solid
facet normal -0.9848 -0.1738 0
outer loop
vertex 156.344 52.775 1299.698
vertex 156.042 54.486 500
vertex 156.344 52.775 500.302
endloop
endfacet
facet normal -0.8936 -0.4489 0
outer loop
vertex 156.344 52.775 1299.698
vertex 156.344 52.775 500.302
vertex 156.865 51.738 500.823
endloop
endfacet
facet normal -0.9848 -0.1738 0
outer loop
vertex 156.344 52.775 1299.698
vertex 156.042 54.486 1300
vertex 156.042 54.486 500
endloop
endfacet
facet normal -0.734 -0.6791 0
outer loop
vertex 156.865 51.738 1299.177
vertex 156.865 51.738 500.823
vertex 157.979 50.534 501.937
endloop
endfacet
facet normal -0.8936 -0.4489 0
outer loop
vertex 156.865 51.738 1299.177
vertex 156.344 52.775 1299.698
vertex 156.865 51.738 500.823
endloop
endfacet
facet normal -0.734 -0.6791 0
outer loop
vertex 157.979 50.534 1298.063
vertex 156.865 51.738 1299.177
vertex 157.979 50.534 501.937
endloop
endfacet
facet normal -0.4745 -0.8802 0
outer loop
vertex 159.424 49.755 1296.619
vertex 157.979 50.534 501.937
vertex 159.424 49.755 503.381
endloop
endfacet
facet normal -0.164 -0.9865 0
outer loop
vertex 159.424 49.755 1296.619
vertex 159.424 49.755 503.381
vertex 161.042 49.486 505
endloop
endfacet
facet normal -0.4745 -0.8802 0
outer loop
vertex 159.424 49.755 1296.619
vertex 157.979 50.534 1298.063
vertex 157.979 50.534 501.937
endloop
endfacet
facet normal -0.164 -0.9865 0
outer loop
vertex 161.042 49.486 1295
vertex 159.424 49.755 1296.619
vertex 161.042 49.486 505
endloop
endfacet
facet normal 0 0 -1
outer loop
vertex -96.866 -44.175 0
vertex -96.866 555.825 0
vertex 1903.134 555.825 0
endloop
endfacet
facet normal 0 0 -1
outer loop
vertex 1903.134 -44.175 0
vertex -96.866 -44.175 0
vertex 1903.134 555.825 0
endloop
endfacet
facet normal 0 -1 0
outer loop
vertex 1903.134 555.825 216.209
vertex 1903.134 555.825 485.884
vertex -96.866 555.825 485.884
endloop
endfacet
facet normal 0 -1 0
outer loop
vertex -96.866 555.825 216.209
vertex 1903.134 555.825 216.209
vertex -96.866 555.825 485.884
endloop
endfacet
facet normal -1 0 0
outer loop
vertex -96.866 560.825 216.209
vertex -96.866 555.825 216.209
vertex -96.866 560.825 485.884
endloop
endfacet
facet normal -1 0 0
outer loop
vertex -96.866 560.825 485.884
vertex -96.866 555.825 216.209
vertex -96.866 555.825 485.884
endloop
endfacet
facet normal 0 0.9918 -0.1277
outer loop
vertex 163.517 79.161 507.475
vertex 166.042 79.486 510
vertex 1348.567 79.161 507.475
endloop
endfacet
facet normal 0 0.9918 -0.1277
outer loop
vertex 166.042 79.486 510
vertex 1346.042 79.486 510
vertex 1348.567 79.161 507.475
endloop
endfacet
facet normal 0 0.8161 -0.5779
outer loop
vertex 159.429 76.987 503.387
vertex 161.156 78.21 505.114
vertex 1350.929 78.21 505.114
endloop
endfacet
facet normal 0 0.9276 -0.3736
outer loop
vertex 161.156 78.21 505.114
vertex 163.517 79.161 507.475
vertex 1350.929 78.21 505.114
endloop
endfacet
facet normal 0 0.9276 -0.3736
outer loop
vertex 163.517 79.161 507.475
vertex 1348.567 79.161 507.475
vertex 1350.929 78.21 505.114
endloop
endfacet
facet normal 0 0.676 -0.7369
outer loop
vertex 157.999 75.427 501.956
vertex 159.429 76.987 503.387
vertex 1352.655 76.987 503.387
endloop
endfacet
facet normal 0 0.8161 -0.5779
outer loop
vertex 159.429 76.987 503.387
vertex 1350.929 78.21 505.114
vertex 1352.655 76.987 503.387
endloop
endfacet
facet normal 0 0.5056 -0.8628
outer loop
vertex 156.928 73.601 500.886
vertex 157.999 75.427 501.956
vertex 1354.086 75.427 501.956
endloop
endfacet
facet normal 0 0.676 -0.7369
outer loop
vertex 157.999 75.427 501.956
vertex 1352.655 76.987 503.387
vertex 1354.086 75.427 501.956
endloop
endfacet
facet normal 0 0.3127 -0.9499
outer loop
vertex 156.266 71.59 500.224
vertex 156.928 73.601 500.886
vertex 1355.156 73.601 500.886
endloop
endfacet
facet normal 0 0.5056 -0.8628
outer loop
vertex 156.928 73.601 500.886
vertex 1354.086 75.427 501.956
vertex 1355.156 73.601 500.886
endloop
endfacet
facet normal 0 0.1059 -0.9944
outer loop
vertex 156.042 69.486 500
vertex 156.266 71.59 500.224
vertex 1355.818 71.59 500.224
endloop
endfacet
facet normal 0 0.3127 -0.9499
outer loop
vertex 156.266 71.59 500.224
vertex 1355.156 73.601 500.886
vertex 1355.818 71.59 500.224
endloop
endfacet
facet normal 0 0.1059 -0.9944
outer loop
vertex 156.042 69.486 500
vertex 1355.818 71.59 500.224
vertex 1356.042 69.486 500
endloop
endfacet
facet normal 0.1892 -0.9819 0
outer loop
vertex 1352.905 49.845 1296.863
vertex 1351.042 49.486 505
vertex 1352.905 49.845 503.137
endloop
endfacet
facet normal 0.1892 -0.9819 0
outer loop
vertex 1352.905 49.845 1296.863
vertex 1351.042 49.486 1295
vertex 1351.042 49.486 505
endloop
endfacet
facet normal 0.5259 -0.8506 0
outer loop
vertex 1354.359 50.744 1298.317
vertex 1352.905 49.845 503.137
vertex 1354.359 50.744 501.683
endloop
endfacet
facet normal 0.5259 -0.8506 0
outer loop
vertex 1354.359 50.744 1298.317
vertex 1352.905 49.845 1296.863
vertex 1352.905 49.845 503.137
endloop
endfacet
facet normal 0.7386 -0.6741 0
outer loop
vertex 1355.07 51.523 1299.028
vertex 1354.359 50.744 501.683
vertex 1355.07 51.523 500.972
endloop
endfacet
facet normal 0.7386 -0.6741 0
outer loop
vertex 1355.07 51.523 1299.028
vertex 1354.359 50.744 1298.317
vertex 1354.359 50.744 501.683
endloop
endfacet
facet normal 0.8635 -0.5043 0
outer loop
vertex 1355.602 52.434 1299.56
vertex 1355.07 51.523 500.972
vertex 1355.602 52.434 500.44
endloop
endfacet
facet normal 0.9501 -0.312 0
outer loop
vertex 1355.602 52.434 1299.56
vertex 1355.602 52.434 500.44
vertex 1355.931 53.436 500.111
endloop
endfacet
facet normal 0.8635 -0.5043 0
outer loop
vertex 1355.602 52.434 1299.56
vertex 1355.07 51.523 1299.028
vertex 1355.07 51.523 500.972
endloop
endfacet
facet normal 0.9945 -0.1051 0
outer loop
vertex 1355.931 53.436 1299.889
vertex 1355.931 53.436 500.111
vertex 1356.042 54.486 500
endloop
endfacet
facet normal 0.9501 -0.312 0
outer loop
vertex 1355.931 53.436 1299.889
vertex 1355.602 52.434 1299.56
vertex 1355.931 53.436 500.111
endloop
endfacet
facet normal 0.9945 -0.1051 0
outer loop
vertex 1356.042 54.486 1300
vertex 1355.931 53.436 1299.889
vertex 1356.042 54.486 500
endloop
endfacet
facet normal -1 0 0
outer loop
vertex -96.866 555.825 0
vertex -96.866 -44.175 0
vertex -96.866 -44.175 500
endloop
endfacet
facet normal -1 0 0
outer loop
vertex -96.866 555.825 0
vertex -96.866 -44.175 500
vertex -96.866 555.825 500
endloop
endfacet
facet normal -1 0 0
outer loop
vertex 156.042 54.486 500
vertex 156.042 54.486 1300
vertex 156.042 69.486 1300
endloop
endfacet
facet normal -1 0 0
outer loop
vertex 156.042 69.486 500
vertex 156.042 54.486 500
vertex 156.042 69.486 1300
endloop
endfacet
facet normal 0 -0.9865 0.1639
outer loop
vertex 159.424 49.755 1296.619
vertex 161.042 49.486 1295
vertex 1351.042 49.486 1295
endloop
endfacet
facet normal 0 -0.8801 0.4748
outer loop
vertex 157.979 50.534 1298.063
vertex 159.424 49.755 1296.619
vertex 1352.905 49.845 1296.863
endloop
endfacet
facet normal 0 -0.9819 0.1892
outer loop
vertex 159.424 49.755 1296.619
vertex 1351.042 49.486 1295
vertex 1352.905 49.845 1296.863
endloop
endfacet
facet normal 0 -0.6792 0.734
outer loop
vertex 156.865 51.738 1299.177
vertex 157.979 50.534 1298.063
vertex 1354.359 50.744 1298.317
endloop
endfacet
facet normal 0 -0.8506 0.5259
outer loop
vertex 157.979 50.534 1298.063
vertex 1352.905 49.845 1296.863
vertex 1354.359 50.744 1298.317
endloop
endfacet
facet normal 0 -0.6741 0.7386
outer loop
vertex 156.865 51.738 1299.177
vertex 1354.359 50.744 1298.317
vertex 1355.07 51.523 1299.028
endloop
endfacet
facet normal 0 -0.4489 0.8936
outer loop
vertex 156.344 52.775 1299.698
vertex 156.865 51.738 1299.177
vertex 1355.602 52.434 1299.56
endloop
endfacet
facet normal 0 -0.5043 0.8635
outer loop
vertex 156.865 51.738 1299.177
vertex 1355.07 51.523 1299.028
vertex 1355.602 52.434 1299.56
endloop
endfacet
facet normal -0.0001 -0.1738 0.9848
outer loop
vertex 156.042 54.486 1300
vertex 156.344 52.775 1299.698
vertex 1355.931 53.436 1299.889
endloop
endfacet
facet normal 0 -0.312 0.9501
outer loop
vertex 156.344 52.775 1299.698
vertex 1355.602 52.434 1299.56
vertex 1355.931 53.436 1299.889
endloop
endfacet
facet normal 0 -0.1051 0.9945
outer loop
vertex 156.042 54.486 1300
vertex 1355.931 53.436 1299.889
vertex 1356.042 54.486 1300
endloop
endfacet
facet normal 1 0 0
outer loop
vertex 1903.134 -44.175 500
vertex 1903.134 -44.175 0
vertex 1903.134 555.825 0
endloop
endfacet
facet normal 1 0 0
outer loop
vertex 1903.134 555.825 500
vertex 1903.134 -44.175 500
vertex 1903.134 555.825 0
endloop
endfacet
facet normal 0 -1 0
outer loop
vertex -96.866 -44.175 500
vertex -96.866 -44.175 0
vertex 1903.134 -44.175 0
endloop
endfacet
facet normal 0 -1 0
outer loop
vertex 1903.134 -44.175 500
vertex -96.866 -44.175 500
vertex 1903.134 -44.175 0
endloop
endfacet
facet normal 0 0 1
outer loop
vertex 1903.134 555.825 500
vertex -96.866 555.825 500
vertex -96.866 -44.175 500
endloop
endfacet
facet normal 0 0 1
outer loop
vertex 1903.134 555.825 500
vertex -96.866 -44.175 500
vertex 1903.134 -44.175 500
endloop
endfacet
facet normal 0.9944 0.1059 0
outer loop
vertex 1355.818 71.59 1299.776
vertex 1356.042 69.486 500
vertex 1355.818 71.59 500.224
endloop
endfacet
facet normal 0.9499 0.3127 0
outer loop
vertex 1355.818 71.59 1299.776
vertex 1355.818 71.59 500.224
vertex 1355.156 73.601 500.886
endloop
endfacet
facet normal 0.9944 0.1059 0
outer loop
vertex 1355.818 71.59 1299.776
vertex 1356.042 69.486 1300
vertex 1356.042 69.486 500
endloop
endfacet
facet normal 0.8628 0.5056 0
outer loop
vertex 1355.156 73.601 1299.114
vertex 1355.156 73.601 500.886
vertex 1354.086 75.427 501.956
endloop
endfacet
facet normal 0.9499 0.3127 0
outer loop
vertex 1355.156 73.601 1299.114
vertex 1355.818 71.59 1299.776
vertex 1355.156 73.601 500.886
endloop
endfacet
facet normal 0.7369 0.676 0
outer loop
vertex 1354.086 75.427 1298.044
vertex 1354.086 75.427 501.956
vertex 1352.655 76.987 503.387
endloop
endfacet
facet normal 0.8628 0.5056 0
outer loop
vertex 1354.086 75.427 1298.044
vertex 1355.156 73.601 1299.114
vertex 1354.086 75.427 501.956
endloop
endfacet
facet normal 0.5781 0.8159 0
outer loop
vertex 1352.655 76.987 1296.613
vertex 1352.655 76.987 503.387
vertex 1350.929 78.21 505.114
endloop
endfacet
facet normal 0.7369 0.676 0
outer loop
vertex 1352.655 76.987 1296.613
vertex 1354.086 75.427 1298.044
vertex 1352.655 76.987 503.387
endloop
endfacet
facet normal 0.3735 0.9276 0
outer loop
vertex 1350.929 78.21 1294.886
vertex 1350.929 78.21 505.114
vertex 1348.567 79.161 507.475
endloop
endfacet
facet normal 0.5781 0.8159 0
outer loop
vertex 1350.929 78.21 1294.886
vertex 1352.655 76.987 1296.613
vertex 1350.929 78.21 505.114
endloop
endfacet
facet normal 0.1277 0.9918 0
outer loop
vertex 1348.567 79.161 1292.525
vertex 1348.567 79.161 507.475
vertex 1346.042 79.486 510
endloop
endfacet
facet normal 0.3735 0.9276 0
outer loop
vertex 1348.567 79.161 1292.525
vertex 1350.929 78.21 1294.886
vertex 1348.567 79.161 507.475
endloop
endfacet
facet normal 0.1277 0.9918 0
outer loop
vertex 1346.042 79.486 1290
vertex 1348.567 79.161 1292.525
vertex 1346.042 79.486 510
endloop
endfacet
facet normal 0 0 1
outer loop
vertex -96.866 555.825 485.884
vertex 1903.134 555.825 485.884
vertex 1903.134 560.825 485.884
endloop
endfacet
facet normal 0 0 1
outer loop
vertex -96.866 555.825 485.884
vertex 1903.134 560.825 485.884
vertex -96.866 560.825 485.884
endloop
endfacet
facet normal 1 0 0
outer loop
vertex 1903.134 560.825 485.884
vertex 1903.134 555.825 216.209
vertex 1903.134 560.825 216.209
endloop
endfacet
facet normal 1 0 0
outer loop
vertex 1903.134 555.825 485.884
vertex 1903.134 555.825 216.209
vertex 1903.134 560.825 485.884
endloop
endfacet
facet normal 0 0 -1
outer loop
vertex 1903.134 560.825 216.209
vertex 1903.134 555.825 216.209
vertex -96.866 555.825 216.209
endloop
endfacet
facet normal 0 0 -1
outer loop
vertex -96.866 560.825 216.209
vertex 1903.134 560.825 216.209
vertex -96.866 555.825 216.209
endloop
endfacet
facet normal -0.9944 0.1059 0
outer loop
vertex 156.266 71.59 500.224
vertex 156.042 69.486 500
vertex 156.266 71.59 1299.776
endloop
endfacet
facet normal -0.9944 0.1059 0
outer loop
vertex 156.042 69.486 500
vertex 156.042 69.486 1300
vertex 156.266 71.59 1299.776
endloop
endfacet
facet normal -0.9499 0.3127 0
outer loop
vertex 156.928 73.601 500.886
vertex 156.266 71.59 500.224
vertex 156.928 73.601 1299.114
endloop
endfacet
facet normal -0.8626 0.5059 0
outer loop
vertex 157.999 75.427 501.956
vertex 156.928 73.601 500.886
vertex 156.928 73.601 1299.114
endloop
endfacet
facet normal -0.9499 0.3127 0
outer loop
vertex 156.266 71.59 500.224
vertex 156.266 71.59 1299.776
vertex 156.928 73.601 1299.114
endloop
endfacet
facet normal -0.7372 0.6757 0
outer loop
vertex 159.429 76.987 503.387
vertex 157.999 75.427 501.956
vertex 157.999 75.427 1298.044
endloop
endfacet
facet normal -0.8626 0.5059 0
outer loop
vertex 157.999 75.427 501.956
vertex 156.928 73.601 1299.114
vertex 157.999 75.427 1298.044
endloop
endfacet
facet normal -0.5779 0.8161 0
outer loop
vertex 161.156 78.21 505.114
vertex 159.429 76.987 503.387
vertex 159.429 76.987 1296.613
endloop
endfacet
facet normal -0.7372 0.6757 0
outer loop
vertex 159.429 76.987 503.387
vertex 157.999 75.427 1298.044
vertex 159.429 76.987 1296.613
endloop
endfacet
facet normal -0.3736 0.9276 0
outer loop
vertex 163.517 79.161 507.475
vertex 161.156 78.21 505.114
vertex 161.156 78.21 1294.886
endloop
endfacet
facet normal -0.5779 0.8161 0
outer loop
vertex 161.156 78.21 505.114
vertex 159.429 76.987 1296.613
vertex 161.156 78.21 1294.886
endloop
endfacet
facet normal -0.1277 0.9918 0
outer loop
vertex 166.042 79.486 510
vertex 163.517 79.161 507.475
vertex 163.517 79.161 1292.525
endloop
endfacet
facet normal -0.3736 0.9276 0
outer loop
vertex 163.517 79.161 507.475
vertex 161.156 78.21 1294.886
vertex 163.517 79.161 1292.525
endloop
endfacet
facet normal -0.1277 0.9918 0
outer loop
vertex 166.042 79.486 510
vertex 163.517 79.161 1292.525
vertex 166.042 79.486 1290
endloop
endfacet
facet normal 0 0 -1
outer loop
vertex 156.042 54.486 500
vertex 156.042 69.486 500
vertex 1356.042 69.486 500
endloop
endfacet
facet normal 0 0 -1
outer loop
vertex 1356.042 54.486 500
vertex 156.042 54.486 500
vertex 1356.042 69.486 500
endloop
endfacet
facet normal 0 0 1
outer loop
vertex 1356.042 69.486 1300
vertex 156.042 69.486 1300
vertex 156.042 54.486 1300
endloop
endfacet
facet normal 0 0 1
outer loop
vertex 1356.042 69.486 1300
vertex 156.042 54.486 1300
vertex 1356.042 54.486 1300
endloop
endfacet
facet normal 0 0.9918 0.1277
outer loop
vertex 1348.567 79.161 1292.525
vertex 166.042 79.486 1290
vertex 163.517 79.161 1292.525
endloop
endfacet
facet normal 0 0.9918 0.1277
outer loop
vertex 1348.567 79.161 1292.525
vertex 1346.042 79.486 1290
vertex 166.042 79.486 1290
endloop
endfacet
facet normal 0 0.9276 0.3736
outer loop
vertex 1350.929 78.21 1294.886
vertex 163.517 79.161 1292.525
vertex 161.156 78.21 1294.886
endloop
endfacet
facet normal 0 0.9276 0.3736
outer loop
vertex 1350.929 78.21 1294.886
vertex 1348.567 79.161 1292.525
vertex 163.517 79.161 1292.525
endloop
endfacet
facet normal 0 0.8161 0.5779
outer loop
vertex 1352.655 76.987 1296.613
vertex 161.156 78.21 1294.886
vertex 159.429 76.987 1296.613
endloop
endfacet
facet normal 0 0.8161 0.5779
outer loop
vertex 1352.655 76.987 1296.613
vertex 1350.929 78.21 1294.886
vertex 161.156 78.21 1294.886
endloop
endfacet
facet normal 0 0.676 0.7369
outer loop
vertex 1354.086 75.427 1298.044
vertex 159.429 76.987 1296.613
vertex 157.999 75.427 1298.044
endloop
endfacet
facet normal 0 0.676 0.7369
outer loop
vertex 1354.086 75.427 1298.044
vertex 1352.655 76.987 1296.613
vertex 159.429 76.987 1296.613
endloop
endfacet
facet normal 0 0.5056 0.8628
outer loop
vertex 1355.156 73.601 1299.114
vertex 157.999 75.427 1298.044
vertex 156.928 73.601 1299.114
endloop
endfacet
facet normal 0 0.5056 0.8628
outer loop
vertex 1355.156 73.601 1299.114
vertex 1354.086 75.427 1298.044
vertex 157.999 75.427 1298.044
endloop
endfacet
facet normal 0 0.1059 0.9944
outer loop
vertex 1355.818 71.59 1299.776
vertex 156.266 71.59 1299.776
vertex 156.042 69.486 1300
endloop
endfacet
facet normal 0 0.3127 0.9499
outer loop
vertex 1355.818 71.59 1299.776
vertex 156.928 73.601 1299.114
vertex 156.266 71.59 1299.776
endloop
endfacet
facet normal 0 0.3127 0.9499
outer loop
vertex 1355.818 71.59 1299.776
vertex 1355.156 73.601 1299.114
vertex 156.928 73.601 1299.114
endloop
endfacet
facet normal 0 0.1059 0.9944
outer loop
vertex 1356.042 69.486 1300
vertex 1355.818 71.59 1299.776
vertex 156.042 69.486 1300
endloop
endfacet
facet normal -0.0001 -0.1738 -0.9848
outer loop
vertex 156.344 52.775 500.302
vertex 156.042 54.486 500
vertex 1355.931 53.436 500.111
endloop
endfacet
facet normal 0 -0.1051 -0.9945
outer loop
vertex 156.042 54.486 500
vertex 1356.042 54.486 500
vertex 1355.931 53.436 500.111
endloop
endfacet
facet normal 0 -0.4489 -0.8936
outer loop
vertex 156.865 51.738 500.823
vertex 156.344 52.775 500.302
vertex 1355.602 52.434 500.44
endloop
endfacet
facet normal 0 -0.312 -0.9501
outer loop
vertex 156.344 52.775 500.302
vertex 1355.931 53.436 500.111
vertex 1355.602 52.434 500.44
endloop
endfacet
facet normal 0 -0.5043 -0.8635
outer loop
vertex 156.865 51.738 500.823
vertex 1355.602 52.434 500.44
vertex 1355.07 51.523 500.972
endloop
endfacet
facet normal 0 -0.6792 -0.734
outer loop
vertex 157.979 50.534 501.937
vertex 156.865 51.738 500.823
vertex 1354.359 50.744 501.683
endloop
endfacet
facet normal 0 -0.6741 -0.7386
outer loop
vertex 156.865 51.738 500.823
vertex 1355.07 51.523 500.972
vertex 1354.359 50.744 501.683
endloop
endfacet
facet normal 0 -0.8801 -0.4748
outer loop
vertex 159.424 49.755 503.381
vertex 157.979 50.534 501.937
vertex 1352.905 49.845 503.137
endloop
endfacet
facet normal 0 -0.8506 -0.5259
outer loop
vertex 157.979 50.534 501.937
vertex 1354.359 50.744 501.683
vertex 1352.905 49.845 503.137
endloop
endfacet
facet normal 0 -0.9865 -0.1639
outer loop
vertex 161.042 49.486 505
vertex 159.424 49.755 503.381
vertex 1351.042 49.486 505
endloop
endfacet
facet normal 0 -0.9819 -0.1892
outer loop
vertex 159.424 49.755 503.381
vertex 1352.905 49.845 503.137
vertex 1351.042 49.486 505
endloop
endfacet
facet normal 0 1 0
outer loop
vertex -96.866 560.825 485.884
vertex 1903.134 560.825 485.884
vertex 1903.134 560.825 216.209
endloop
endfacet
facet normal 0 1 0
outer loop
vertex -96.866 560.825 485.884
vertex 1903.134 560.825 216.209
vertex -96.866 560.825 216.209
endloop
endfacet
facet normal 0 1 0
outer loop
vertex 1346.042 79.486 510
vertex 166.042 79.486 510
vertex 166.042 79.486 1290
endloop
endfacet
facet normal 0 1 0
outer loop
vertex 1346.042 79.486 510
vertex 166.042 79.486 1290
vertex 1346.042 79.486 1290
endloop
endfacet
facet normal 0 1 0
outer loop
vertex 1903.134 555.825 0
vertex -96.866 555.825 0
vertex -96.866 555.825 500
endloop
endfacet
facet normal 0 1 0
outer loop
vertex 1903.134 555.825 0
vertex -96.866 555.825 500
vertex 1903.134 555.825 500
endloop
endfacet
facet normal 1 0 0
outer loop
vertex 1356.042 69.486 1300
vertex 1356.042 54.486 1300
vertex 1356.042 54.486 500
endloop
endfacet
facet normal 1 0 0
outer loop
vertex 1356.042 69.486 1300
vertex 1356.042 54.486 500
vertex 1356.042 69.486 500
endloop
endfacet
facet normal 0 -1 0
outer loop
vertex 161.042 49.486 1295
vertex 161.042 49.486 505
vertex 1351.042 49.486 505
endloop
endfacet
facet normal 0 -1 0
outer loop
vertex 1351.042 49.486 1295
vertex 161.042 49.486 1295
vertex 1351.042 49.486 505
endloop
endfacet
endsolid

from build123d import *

# Parameters (mm, degrees)
F0_W     = 2000
F0_H     = 600
F1_DEPTH = 500
F2_W     = 1200
F2_H     = 30
F3_DEPTH = 800
F4_R     = 10
F5_R     = 5
F6_W     = 2000
F6_H     = 269.675389
F7_DEPTH = 5


with BuildPart() as f1:
    # F0 (on Top) → F1 (new body)
    with BuildSketch(Plane.XY):
        with Locations((903.133789, 255.824527)):
            Rectangle(F0_W, F0_H)
    extrude(amount=F1_DEPTH)


with BuildPart() as f3:
    # F2 (on face) → F3 (new body)
    with BuildSketch(Plane.XY.offset(500)):
        with Locations((756.042376, 64.485501)):
            Rectangle(F2_W, F2_H)
    extrude(amount=F3_DEPTH)

    # F4
    f4_edges = [f3.edges().sort_by_distance(p)[0] for p in [
        (1356.042376, 79.485501, 900),
        (156.042376, 79.485501, 900),
        (756.042376, 79.485501, 500),
        (756.042376, 79.485501, 1300),
    ]]
    fillet(f4_edges, radius=F4_R)

    # F5
    f5_edges = [f3.edges().sort_by_distance(p)[0] for p in [
        (156.042376, 49.485501, 900),
        (1356.042376, 49.485501, 900),
        (756.042376, 49.485501, 500),
        (756.042376, 49.485501, 1300),
    ]]
    fillet(f5_edges, radius=F5_R)


with BuildPart() as f7:
    # F6 (on face) → F7 (new body)
    with BuildSketch(Plane(origin=(0, 555.824527, 0), x_dir=(-1, 0, 0), z_dir=(0, 1, 0))):
        with Locations((-903.133789, 351.046405)):
            Rectangle(F6_W, F6_H)
    extrude(amount=F7_DEPTH)


solid = Compound([f1.part, f3.part, f7.part])
